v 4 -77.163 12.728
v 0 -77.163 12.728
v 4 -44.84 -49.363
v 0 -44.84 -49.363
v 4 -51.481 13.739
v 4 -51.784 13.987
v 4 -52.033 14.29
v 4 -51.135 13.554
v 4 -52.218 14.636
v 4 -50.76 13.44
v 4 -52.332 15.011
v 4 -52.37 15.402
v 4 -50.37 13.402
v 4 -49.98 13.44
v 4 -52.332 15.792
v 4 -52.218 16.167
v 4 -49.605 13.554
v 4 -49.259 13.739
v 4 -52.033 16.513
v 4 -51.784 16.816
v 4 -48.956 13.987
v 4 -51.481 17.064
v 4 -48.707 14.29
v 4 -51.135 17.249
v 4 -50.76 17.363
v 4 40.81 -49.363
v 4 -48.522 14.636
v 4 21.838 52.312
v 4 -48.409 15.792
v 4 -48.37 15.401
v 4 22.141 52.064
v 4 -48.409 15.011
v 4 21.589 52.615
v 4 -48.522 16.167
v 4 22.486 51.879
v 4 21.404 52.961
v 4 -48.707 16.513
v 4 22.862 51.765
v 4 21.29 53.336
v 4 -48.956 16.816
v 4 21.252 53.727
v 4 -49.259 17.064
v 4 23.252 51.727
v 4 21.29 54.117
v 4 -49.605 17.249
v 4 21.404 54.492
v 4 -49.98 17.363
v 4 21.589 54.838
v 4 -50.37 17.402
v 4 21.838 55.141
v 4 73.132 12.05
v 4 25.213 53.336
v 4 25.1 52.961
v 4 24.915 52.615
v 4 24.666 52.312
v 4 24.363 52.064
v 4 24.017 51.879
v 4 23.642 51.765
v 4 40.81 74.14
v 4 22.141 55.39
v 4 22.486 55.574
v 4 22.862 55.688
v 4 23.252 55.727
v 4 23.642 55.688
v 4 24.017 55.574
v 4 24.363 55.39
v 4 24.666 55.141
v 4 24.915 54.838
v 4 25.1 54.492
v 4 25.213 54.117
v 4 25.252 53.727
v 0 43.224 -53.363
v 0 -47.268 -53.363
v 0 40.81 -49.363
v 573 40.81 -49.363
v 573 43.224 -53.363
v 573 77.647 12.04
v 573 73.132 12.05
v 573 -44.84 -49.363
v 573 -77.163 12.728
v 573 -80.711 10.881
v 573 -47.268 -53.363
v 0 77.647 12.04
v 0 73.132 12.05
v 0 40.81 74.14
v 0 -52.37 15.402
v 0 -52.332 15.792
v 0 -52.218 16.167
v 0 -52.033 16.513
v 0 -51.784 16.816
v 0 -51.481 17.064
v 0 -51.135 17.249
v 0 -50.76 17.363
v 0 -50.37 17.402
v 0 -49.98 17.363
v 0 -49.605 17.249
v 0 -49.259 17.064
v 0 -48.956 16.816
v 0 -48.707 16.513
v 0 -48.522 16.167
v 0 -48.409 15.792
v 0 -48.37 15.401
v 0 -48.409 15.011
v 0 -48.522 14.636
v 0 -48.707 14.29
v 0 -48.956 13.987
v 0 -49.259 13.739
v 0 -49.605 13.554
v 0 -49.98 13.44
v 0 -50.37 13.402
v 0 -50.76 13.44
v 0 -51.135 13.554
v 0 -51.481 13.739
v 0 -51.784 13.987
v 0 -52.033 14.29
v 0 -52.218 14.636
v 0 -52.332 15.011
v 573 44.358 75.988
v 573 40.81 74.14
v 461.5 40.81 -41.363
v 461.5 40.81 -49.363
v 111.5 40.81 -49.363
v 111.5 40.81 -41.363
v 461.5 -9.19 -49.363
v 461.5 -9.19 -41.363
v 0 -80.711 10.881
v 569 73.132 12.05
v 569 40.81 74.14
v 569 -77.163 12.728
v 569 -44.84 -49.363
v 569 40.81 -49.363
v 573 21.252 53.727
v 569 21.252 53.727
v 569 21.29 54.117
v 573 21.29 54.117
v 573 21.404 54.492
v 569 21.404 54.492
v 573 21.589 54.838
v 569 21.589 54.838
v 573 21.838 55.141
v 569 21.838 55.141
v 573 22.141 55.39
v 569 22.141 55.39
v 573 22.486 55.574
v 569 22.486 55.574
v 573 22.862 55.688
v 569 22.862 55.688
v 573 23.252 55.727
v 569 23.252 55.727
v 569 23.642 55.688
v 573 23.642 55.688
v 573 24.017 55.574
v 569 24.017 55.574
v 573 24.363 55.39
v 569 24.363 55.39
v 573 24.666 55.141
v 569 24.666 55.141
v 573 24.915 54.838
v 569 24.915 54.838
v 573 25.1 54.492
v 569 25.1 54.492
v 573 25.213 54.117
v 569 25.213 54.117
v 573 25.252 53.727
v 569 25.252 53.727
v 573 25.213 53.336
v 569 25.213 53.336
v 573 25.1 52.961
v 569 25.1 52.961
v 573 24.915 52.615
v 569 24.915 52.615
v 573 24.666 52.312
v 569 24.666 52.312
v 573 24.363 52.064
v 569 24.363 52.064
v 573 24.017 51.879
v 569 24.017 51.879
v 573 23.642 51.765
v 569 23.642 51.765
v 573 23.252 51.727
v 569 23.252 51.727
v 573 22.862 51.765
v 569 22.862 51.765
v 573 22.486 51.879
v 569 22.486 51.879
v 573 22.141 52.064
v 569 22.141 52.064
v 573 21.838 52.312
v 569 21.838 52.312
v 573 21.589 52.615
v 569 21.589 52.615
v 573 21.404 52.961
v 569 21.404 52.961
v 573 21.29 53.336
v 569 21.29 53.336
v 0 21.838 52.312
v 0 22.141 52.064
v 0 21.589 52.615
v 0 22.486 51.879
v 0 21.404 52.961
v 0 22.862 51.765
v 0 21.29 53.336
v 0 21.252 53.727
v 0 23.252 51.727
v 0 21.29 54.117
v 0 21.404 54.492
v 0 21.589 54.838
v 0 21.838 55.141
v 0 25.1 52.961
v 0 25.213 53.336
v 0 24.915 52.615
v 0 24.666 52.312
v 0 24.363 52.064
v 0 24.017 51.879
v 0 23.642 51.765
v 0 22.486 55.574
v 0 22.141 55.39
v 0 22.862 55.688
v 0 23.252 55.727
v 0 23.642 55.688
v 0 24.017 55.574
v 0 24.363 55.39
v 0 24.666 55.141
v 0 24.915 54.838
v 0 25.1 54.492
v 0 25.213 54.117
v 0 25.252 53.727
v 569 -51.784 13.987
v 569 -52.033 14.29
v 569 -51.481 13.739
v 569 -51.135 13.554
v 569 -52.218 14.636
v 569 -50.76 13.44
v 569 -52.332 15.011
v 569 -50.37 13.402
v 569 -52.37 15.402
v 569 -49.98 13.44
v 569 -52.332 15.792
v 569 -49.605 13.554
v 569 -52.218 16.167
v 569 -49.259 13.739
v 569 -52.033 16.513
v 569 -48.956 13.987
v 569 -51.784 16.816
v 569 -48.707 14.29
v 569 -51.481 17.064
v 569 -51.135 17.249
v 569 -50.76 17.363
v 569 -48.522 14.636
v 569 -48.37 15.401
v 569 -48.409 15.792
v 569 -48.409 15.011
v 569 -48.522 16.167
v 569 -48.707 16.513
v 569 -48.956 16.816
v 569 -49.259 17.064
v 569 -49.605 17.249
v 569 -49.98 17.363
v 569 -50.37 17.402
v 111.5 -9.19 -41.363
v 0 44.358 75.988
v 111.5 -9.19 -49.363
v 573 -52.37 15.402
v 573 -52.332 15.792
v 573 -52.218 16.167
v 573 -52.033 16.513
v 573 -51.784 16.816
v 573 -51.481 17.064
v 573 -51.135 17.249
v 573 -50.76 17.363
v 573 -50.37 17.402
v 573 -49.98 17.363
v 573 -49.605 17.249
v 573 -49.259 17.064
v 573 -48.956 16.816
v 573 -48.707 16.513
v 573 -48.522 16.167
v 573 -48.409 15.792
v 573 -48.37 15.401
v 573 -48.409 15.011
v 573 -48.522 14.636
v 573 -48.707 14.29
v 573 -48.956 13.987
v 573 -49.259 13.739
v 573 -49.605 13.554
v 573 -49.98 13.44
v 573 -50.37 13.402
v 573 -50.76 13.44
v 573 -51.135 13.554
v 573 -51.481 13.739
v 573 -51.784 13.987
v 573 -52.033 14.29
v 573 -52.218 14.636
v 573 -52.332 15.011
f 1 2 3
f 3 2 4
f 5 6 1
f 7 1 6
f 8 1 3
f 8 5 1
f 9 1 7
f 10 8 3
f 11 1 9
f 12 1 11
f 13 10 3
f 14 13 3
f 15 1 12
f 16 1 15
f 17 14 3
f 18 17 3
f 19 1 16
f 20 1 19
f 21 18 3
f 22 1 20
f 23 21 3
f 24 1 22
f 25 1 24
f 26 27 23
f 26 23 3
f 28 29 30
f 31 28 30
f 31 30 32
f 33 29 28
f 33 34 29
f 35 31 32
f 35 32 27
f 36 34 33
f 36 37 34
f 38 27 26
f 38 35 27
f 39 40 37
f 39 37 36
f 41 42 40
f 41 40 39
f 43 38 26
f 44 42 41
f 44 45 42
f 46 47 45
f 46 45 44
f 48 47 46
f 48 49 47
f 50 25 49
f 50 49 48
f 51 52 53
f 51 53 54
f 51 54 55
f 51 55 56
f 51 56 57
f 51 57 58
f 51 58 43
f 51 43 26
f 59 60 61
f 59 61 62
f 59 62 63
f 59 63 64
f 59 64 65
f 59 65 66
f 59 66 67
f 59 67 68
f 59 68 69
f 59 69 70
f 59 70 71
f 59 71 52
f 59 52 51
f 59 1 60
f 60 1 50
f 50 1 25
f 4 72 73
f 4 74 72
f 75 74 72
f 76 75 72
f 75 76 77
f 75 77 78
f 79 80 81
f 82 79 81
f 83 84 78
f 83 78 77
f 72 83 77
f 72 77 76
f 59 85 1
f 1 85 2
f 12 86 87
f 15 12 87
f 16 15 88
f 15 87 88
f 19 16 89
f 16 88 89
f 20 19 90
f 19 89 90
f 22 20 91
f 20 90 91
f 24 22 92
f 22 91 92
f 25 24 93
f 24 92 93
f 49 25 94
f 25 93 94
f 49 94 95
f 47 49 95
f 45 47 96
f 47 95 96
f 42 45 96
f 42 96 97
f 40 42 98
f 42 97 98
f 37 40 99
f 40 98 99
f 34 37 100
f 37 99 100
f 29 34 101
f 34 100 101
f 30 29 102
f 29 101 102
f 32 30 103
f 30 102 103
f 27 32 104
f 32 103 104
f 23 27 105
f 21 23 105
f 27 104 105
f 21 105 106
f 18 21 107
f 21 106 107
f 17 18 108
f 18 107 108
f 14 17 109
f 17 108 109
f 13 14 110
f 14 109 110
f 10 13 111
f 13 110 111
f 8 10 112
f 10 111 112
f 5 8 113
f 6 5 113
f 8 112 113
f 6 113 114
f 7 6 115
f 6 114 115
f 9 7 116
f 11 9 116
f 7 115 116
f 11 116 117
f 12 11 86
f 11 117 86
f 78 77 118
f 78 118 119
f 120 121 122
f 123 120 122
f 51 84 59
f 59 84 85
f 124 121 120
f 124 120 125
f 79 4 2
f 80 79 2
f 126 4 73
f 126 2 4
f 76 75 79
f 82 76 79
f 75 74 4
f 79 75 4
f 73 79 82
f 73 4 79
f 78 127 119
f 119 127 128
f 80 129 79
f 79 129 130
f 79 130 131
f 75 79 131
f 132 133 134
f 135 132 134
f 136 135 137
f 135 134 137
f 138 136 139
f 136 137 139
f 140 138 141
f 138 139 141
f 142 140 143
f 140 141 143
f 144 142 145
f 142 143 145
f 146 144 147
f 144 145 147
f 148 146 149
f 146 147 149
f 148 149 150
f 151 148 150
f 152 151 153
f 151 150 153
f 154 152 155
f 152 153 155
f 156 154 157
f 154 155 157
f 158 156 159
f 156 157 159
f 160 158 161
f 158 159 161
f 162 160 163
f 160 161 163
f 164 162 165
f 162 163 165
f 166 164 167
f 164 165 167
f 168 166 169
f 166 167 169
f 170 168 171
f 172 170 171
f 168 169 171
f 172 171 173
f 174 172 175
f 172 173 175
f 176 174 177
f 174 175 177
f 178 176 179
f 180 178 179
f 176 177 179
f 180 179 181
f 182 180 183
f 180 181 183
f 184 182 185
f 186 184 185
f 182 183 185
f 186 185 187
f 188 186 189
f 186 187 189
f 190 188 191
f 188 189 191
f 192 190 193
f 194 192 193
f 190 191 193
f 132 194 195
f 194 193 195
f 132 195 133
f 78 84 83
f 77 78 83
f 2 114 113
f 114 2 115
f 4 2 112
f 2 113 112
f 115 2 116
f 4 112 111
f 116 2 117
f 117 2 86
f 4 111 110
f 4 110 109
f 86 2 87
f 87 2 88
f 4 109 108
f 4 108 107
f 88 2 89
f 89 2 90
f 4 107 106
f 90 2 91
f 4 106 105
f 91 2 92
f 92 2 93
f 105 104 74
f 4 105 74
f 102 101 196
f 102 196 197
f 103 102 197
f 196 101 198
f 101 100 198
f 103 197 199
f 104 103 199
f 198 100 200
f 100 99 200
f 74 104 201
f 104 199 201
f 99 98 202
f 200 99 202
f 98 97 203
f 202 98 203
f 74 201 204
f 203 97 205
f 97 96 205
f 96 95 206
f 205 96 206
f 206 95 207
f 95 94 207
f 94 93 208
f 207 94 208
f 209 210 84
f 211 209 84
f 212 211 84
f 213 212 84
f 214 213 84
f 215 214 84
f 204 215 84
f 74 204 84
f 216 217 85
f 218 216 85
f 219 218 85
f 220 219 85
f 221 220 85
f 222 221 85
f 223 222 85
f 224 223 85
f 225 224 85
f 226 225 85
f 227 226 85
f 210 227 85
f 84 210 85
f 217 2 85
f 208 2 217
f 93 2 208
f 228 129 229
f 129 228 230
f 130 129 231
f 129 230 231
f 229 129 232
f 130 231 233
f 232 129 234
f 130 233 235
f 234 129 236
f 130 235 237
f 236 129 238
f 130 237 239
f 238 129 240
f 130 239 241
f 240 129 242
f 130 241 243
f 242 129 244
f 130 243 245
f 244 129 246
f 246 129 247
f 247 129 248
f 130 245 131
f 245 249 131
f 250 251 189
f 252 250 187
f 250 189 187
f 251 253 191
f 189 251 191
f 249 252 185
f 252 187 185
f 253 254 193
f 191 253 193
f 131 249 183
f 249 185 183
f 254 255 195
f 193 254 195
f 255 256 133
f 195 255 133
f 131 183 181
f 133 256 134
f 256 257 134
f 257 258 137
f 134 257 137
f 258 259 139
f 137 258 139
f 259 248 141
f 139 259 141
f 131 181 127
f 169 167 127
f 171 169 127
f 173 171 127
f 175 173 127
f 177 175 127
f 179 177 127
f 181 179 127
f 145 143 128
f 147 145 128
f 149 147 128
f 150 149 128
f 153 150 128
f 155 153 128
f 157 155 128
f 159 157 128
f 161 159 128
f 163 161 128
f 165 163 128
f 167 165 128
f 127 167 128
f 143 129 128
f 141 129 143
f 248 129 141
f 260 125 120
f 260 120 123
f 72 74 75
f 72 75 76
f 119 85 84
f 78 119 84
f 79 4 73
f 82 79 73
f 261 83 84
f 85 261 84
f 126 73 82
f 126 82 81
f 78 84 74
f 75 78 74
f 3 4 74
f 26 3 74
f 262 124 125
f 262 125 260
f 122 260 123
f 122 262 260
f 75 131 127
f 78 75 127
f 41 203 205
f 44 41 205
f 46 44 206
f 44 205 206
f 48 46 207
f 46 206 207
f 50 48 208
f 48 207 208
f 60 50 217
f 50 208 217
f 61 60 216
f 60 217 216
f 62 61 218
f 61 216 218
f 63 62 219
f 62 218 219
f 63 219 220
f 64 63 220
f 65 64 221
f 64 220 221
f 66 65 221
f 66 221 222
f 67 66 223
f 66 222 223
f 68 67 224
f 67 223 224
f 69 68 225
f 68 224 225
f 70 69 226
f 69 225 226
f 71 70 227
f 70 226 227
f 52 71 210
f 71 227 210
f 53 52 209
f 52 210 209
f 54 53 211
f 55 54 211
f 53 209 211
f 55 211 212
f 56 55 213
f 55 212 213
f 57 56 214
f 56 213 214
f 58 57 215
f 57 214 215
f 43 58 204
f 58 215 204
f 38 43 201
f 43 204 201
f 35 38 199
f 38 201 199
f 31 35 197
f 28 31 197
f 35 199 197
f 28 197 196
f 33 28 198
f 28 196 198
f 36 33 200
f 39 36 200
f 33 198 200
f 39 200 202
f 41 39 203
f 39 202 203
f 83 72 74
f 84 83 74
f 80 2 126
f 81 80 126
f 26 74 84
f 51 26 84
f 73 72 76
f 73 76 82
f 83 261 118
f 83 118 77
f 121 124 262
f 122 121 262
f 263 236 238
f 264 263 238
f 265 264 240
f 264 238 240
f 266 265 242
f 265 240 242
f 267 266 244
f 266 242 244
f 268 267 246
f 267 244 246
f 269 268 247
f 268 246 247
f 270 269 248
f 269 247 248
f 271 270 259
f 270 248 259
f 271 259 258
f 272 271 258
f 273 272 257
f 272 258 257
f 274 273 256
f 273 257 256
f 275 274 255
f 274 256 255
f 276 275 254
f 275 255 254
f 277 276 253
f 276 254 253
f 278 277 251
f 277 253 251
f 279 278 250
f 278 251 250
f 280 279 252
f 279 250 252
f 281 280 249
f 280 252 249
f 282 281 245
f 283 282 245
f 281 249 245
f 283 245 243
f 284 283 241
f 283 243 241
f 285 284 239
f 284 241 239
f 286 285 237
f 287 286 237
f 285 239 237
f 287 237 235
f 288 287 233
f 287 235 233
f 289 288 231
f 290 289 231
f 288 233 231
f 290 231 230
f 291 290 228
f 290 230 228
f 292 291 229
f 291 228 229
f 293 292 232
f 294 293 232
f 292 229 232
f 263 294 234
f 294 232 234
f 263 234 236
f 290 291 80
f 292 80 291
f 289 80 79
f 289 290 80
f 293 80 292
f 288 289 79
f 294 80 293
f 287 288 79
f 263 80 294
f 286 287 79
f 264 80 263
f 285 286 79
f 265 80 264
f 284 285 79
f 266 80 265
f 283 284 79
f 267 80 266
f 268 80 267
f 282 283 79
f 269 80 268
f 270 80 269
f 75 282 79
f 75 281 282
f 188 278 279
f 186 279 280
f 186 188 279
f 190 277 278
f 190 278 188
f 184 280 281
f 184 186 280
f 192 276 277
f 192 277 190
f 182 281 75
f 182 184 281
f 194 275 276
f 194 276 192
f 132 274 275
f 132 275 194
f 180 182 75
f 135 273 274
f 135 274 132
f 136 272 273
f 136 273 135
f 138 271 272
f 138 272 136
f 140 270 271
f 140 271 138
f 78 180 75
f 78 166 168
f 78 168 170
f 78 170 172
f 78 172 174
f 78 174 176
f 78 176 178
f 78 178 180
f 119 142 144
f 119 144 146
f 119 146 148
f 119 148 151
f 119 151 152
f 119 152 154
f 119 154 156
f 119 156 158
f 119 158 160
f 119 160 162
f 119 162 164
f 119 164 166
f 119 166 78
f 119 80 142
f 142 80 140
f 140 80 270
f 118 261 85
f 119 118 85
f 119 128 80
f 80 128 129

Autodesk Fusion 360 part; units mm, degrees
sketch "Sketch1" plane through (0, 0, 0) normal (1, 0, 0) x (0, 1, 0) in component "Panel1"
  line L0 (-44.8404, -49.3629) -> (40.8096, -49.3629)
  line L1 (40.8096, -49.3629) -> (73.132, 12.0497)
  line L2 (73.132, 12.0497) -> (40.8096, 74.1405)
  line L3 (40.8096, 74.1405) -> (-77.1628, 12.7279)
  line L4 (-77.1628, 12.7279) -> (-44.8404, -49.3629)
  dimension "d7" = 70
  dimension "d8" = 133
  dimension "d9" = 27.5
extrude "Extrude1" add sketch "Sketch1" along normal blind 4 makes body 1 in component "Panel1"
sketch "Sketch2" plane through (0, 0, 0) normal (-1, 0, 0) x (0, -1, 0) in component "Panel1"
  line L0 (44.8404, -49.3629) -> (77.1628, 12.7279)
  line L1 (77.1628, 12.7279) -> (-40.8096, 74.1405)
  line L2 (-40.8096, 74.1405) -> (-73.132, 12.0497)
  line L3 (-73.132, 12.0497) -> (-40.8096, -49.3629)
  line L4 (-40.8096, -49.3629) -> (44.8404, -49.3629)
  circle A0 centre (-23.2518, 53.7266) radius 2
  circle A1 centre (50.3701, 15.4015) radius 2
  dimension "d12" = 4
  dimension "d13" = 10
  dimension "d14" = 25
  dimension "d15" = 10
  dimension "d16" = 25
extrude "Extrude2" cut sketch "Sketch2" against normal through all contours A0 | A1 bodies 1 in component "Panel1"
sketch "Sketch1 (2)" plane through (0, 0, 0) normal (-1, 0, 0) x (0, -1, 0) in component "Case"
  line L0 (44.8404, -49.3629) -> (77.1628, 12.7279)
  line L1 (-40.8096, 74.1405) -> (-73.132, 12.0497)
  line L2 (-73.132, 12.0497) -> (-40.8096, -49.3629)
  line L3 (-40.8096, -49.3629) -> (44.8404, -49.3629)
  line L4 (-44.3576, 75.9875) -> (-77.6468, 12.0395)
  line L5 (-77.6468, 12.0395) -> (-43.2245, -53.3629)
  line L6 (-43.2245, -53.3629) -> (47.2677, -53.3629)
  line L7 (47.2677, -53.3629) -> (80.7109, 10.8809)
  line L8 (-44.3576, 75.9875) -> (-40.8096, 74.1405)
  line L9 (77.1628, 12.7279) -> (80.7109, 10.8809)
  line L10 (44.8404, -49.3629) -> (47.2677, -53.3629)
  line L11 (-40.8096, -49.3629) -> (-43.2245, -53.3629)
  line L12 (-73.132, 12.0497) -> (-77.6468, 12.0395)
  dimension "d22" = 4
extrude "Extrude1'" add sketch "Sketch1 (2)" against normal blind 573 separate body contours L1 L4 L8 L12 makes body 2 in component "Case"
extrude "Extrude2'" add sketch "Sketch1 (2)" against normal blind 573 separate body contours L2 L5 L11 L12 makes body 3 in component "Case"
extrude "Extrude3" add sketch "Sketch1 (2)" against normal blind 573 separate body contours L3 L6 L10 L11 makes body 4 in component "Case"
extrude "Extrude4" add sketch "Sketch1 (2)" against normal blind 573 separate body contours L0 L7 L9 L10 makes body 5 in component "Case"
sketch "Sketch2 (2)" plane through (0, 0, -49.3629) normal (0, 0, 1) x (-1, 0, 0) in component "Case"
  line L0 (0, -40.8096) -> (0, 44.8404)
  line L1 (0, 44.8404) -> (-573, 44.8404)
  line L2 (-573, 44.8404) -> (-573, -40.8096)
  line L3 (-573, -40.8096) -> (0, -40.8096)
  line L4 (-111.5, -40.8096) -> (-461.5, -40.8096)
  line L5 (-461.5, -40.8096) -> (-461.5, 9.1904)
  line L6 (-461.5, 9.1904) -> (-111.5, 9.1904)
  line L7 (-111.5, 9.1904) -> (-111.5, -40.8096)
  line L8 (-4, -40.8096) -> (-4, 77.1628)
  dimension "d31" = 107.5
  dimension "d32" = 350
  dimension "d33" = 50
extrude "Extrude5" add sketch "Sketch2 (2)" along normal blind 8 separate body contours L3 L4 L5 L6 L7 makes body 6 in component "Case"
component "Panel1" placed x (1, 0, 0) y (0, 1, 0) z (0, 0, 1) at (569, 0, 0)
component "Panel1" placed x (1, 0, 0) y (0, 1, 0) z (0, 0, 1) at (0, 0, 0)
component "Case" placed x (1, 0, 0) y (0, 1, 0) z (0, 0, 1) at (0, 0, 0)
equation "FrameX = 565 mm"
equation "FrameY = 133 mm"
equation "ModuleDepth = 70 mm"
equation "Angle = 27.5 deg"
equation "Thickness = 4 mm"
equation "d7 = ModuleDepth"
equation "d8 = FrameY"
equation "d9 = Angle"
equation "d10 = Thickness"
equation "d21 = Thickness + FrameX"
equation "d22 = Thickness"
equation "d23 = -( Thickness * 2 + FrameX )"
equation "d25 = -( Thickness * 2 + FrameX )"
equation "d27 = -( Thickness * 2 + FrameX )"
equation "d29 = -( Thickness * 2 + FrameX )"
equation "d31 = FrameX / 2 - ( 350 / 2 ) * 1 mm"
